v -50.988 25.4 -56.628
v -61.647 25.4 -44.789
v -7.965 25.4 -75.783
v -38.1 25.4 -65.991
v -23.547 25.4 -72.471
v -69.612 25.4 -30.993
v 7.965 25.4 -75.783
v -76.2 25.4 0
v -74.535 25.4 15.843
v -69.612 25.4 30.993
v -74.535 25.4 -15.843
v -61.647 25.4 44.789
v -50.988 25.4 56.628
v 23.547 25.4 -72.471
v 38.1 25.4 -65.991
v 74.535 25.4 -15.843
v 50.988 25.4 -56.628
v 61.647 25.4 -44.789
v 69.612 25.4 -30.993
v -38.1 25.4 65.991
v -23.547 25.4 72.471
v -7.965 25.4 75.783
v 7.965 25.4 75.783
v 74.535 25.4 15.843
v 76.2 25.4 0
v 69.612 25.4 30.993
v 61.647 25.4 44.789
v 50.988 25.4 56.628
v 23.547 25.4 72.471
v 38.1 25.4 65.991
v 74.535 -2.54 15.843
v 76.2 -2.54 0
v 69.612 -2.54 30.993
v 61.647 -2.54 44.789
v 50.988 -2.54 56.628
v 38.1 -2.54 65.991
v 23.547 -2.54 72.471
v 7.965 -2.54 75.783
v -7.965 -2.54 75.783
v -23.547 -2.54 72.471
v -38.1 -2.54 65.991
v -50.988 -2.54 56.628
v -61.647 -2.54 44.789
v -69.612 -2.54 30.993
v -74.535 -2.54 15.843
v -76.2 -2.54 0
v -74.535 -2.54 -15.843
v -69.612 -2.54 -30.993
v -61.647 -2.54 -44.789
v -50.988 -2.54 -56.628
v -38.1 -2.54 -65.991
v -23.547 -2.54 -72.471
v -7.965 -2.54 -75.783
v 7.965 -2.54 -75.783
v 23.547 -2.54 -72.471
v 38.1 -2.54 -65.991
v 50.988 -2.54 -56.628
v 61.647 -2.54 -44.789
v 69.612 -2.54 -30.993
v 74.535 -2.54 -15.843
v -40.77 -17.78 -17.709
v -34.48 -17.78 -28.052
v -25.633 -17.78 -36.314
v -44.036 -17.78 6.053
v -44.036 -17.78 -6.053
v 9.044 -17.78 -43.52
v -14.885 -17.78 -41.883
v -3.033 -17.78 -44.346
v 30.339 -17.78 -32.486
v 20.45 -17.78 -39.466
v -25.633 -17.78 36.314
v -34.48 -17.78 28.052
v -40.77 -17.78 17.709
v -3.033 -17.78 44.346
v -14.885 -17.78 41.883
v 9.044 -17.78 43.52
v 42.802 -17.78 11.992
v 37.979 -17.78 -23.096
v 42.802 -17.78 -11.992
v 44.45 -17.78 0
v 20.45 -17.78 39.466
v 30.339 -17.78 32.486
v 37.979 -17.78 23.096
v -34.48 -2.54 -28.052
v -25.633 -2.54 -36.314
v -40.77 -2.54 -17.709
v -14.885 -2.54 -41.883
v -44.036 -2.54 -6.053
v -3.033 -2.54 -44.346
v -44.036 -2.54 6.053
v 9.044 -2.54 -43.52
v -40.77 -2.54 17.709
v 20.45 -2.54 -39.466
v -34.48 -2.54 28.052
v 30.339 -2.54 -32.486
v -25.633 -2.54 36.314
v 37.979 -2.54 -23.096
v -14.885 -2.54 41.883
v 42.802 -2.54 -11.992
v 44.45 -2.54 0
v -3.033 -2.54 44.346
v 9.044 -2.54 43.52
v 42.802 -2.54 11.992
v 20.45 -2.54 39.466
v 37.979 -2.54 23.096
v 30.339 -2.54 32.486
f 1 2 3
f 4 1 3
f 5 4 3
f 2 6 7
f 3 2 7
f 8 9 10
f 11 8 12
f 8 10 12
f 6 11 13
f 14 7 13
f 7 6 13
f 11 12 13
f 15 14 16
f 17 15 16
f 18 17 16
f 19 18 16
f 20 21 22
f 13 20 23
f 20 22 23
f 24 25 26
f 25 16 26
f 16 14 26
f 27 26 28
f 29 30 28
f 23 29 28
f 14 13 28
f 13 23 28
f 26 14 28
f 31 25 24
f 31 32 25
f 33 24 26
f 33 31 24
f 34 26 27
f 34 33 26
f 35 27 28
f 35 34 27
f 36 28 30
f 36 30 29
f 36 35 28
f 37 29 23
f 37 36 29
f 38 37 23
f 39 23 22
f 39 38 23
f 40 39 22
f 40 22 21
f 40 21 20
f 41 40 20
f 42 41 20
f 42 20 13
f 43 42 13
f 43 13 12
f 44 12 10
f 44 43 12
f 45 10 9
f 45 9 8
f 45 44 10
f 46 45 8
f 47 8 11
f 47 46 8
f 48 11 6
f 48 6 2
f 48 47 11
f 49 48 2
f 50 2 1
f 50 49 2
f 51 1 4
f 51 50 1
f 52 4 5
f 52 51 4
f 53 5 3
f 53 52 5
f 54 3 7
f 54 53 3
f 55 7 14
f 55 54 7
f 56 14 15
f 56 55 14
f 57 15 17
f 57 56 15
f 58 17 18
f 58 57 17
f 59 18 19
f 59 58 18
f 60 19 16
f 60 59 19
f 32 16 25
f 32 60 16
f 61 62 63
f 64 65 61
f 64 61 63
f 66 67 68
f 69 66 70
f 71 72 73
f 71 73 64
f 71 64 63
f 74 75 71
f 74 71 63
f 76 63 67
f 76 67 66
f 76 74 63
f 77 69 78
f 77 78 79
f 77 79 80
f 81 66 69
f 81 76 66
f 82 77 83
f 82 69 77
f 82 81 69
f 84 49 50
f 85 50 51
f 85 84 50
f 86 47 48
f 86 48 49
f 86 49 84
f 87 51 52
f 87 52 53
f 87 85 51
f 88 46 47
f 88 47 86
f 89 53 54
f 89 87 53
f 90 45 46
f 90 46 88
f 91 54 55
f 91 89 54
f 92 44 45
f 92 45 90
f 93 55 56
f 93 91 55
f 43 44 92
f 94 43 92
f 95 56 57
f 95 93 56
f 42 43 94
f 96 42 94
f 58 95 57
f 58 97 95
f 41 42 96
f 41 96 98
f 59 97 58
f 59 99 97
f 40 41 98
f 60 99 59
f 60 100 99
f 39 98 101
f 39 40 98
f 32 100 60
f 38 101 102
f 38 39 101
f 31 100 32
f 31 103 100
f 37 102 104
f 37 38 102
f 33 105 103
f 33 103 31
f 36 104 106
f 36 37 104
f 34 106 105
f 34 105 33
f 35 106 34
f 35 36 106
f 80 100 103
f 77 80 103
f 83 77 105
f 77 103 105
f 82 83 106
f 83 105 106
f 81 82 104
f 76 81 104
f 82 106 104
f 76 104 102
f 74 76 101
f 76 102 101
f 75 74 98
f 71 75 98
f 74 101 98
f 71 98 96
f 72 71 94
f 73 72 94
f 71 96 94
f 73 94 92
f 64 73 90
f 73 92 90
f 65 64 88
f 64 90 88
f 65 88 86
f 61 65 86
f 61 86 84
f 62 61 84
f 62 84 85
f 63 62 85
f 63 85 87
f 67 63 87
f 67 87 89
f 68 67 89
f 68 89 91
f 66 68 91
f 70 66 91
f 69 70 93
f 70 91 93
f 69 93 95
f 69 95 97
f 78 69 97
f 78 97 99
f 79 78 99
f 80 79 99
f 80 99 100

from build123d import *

# Parameters (mm, degrees)
F0_R     = 76.2
F0_R_2   = 44.45
F1_DEPTH = 2.54
F2_DEPTH = 17.78
F3_DEPTH = 25.4


with BuildPart() as f1:
    # F0 (on Front) → F1 (new body)
    with BuildSketch(Plane.XZ):
        Circle(F0_R)
        Circle(F0_R_2, mode=Mode.SUBTRACT)
    extrude(amount=F1_DEPTH)

    # F0 (on Front) → F2 (join)
    with BuildSketch(Plane.XZ):
        Circle(F0_R_2)
    extrude(amount=F2_DEPTH)

    # F0 (on Front) → F3 (join)
    with BuildSketch(Plane.XZ):
        Circle(F0_R)
        Circle(F0_R_2, mode=Mode.SUBTRACT)
        Circle(F0_R_2)
    extrude(amount=-F3_DEPTH)


solid = f1.part
